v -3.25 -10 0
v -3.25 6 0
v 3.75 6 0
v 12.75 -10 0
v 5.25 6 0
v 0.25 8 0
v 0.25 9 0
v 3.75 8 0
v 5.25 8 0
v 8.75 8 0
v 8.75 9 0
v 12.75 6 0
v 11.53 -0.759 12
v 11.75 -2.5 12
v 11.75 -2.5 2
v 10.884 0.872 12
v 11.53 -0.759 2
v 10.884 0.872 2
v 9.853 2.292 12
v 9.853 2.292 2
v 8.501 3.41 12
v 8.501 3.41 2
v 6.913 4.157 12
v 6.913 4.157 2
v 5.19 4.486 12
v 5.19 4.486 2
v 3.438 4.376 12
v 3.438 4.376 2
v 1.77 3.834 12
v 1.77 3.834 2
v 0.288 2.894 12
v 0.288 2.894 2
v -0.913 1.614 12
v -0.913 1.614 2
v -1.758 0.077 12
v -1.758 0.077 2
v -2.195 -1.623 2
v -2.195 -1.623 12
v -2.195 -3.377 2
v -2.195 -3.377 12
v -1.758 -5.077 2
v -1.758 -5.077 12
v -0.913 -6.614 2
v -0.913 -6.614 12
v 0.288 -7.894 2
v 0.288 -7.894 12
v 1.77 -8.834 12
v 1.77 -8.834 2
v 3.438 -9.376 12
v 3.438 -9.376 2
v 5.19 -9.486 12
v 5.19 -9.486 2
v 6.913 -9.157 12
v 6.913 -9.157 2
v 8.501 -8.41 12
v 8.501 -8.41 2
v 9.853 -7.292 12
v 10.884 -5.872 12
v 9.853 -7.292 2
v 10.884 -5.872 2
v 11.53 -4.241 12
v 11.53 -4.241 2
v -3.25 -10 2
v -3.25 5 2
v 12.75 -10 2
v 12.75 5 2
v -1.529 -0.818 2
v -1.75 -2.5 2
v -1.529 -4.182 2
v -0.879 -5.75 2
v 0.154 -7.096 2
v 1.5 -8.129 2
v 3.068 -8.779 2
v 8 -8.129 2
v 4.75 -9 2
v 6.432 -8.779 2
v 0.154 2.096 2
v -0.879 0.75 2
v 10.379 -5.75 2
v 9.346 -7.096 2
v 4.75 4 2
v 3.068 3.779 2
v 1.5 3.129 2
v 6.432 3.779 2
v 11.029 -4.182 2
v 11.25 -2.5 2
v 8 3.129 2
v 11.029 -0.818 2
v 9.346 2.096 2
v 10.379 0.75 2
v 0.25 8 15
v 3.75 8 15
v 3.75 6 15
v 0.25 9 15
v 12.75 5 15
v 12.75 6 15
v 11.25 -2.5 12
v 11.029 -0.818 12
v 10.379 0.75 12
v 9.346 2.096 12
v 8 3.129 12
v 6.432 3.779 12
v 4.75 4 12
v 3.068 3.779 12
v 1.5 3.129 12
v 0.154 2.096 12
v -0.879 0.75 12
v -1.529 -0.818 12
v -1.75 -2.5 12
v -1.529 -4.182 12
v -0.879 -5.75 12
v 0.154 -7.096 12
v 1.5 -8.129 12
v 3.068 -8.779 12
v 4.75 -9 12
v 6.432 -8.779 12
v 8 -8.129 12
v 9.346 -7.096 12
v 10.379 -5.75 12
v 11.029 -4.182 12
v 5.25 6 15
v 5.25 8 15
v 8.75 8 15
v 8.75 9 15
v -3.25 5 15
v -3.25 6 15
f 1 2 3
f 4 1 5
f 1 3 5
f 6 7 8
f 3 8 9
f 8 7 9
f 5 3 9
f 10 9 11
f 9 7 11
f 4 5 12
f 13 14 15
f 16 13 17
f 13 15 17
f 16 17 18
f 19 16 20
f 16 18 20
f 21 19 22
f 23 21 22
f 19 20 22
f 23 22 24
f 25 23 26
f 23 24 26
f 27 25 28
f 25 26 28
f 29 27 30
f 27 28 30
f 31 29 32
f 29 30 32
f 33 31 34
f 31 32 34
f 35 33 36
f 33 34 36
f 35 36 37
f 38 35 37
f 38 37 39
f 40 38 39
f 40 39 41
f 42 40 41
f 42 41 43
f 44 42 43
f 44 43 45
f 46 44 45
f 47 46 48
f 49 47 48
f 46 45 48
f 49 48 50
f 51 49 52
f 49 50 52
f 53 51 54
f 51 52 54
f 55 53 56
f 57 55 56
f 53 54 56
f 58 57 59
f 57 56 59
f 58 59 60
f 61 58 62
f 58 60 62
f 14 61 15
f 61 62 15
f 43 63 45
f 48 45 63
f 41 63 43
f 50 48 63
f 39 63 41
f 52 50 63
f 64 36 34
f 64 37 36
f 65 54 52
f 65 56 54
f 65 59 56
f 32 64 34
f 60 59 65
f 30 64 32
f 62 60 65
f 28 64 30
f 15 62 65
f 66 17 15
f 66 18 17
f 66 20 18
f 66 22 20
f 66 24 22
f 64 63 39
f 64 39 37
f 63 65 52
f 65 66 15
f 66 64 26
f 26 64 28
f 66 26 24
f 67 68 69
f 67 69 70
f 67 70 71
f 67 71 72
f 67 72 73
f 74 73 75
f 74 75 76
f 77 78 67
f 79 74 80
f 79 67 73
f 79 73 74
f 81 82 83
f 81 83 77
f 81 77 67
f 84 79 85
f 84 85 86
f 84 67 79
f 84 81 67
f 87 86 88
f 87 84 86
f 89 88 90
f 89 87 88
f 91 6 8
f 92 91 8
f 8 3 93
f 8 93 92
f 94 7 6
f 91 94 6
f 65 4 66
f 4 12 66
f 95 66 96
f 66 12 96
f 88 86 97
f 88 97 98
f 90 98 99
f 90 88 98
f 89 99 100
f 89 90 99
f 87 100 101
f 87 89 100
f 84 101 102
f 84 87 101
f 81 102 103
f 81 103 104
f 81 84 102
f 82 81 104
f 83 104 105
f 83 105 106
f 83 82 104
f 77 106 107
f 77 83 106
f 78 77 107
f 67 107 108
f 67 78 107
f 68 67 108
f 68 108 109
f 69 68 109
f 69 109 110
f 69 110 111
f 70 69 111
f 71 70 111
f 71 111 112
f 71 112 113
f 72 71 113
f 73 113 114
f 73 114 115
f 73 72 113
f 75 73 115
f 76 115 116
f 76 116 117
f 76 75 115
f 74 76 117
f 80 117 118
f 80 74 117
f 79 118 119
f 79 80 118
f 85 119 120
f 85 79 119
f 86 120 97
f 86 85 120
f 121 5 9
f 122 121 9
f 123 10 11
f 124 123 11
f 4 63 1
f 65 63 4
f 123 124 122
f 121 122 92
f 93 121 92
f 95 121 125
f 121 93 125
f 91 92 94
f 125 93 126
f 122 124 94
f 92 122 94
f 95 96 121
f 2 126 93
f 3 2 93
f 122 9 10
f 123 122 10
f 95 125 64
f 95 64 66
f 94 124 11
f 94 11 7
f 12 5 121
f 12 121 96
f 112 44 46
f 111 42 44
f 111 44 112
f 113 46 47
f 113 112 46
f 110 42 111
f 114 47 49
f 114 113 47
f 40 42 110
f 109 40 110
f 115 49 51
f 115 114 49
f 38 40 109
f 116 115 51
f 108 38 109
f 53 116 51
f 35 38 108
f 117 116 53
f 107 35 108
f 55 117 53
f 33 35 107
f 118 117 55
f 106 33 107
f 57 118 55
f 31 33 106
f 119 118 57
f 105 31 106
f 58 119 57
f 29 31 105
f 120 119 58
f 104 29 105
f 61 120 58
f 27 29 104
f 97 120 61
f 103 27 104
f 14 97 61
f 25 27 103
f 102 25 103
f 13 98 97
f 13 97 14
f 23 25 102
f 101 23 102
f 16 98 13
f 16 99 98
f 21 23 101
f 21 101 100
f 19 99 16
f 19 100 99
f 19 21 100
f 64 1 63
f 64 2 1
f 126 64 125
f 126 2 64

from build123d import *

# Parameters (mm, degrees)
F0_W     = 1.5
F0_H     = 2
F1_DEPTH = 15
F3_DEPTH = 1
F4_W     = 16
F4_H     = 2
F5_DEPTH = 15
F6_R     = 7
F6_R_2   = 6.5
F7_DEPTH = 10


with BuildPart() as f1:
    # F0 (on Top) → F1 (new body)
    with BuildSketch(Plane.XY):
        with Locations((4.5, 7)):
            Rectangle(F0_W, F0_H)
        Polygon((0.25, 8), (3.75, 8), (5.25, 8), (8.75, 8), (8.75, 9), (0.25, 9), align=None)
    extrude(amount=F1_DEPTH)

    # F2 (on face) → F3 (join)
    with BuildSketch(Plane.XZ.offset(-6)):
        Polygon((12.75, 15), (3.75, 15), (-3.25, 15), (-3.25, 0), (12.75, 0), align=None)
    extrude(amount=F3_DEPTH)

    # F4 (on face) → F5 (join)
    with BuildSketch(Plane.XZ.offset(-5)):
        with Locations((4.75, 1)):
            Rectangle(F4_W, F4_H)
    extrude(amount=F5_DEPTH)

    # F6 (on face) → F7 (join)
    with BuildSketch(Plane.XY.offset(2)):
        with Locations((4.75, -2.5)):
            Circle(F6_R)
        with Locations((4.75, -2.5)):
            Circle(F6_R_2, mode=Mode.SUBTRACT)
    extrude(amount=F7_DEPTH)


solid = f1.part
